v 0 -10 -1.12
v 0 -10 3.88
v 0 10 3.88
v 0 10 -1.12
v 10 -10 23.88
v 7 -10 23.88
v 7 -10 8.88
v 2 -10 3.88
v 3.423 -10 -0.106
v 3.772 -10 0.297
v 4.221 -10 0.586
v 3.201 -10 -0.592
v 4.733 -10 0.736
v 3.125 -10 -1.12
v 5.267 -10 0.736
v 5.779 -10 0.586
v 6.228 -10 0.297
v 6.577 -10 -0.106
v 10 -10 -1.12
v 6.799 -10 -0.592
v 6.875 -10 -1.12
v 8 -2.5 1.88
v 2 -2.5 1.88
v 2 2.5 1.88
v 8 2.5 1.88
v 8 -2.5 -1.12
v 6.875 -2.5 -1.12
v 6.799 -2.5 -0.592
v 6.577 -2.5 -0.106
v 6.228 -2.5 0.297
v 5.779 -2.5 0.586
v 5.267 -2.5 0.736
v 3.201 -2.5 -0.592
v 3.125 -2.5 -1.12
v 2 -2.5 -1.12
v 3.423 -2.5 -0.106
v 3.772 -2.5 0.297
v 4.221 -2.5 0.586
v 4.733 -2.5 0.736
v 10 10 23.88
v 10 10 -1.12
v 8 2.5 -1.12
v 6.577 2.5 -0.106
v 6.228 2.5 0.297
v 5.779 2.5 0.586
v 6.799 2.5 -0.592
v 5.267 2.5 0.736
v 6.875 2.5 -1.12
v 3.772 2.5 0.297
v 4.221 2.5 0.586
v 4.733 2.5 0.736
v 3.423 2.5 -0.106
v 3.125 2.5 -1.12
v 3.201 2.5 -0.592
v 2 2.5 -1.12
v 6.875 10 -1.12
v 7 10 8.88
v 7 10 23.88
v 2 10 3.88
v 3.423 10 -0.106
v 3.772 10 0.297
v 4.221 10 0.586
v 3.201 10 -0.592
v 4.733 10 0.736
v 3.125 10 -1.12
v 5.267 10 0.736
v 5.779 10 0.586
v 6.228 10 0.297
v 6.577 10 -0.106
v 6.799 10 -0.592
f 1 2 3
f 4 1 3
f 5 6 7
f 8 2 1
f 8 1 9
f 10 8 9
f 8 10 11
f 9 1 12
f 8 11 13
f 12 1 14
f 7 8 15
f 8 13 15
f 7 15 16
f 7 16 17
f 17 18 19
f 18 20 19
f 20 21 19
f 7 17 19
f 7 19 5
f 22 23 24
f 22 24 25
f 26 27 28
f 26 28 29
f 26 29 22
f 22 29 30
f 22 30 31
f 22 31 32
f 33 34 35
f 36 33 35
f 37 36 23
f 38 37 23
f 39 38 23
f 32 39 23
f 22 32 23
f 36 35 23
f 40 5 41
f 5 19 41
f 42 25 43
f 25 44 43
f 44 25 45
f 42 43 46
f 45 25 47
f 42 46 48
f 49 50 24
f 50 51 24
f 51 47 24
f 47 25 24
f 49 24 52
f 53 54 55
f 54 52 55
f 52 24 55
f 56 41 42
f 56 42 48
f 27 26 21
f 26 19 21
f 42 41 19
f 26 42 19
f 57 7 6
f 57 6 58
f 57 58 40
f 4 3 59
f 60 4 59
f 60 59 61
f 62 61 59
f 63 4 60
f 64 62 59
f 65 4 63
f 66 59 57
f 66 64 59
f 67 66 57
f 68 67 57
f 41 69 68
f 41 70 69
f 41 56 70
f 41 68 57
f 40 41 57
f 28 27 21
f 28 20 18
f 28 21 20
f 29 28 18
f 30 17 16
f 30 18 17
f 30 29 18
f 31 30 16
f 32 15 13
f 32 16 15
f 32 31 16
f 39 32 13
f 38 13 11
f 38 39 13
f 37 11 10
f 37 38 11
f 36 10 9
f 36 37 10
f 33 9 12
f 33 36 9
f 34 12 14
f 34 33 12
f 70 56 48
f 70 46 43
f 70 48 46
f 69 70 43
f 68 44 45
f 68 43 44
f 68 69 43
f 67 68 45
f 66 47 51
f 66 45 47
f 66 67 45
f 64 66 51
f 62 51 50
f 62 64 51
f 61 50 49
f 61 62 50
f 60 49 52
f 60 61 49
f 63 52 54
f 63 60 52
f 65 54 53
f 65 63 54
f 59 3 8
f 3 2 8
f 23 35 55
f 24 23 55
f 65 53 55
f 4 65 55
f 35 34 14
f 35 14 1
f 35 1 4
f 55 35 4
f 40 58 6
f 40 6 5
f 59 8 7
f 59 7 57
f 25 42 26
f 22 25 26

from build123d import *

# Parameters (mm, degrees)
BOSS_EXTRUDE1_DEPTH     = 10
CUT_EXTRUDE2_DEPTH      = 4.88
CUT_EXTRUDE4_DEPTH      = 18.67766953
CUT_EXTRUDE4_DEPTH_BACK = 18.67766953
SKETCH6_3_R             = 1.875
CUT_EXTRUDE5_DEPTH      = 24.58495283
CUT_EXTRUDE5_DEPTH_BACK = 24.58495283
SKETCH7_OUTSIDE_W       = 17.386
SKETCH7_OUTSIDE_H       = 22.386
SKETCH8_W               = 3
SKETCH8_H               = 20
BOSS_EXTRUDE2_DEPTH     = 20
CHAMFER1_SIZE           = 5


with BuildPart() as part:
    # Sketch2 → Boss-Extrude1 (new body)
    with BuildSketch(Plane.YZ):
        Polygon((-10, -7.5), (-4, -7.5), (-5, -5.5), (-2.5, -5.5), (-2.5, -3), (2.5, -3), (2.5, -5.5), (5, -5.5), (4, -7.5), (10, -7.5), (10, 7.5), (-10, 7.5), align=None)
    extrude(amount=BOSS_EXTRUDE1_DEPTH)

    # Sketch4 → Cut-Extrude2 (cut)
    with BuildSketch(Plane(origin=(0, 0, -3), x_dir=(1, 0, 0), z_dir=(0, 0, -1))):
        Polygon((5, 2.5), (2, 2.5), (2, -2.5), (8, -2.5), (8, 2.5), align=None)
    extrude(amount=-CUT_EXTRUDE2_DEPTH, mode=Mode.SUBTRACT)

    # Sketch6<3> → Cut-Extrude4 (cut, two sides: drawn at the far end of the back side and taken through both)
    with BuildSketch(Plane.XZ.offset(-2.5).offset(-CUT_EXTRUDE4_DEPTH_BACK)):
        with Locations((5, -1.12)):
            Circle(SKETCH6_3_R)
    extrude(amount=CUT_EXTRUDE4_DEPTH + CUT_EXTRUDE4_DEPTH_BACK, mode=Mode.SUBTRACT)

    # Sketch7 outside → Cut-Extrude5 (cut, two sides: drawn at the far end of the back side and taken through both)
    with BuildSketch(Plane(origin=(0, 10, 0), x_dir=(-1, 0, 0), z_dir=(0, 1, 0)).offset(-CUT_EXTRUDE5_DEPTH_BACK)):
        with Locations((-5, 0)):
            Rectangle(SKETCH7_OUTSIDE_W, SKETCH7_OUTSIDE_H)
        with BuildLine():
            Line((-10, -1.12), (-6.875, -1.12))
            ThreePointArc((-6.875, -1.12), (-5, 0.755), (-3.125, -1.12))
            Line((-3.125, -1.12), (0, -1.12))
            Line((0, -1.12), (0, 3.88))
            Line((0, 3.88), (-10, 3.88))
            Line((-10, 3.88), (-10, -1.12))
        make_face(mode=Mode.SUBTRACT)
    extrude(amount=CUT_EXTRUDE5_DEPTH + CUT_EXTRUDE5_DEPTH_BACK, mode=Mode.SUBTRACT)

    # Sketch8 → Boss-Extrude2 (add)
    with BuildSketch(Plane.XY.offset(3.88)):
        with Locations((8.5, 0)):
            Rectangle(SKETCH8_W, SKETCH8_H)
    extrude(amount=BOSS_EXTRUDE2_DEPTH)

    # Chamfer1
    chamfer1_edges = [part.edges().sort_by_distance(p)[0] for p in [
        (7, 0, 3.88),
    ]]
    chamfer(chamfer1_edges, length=CHAMFER1_SIZE)


solid = part.part
